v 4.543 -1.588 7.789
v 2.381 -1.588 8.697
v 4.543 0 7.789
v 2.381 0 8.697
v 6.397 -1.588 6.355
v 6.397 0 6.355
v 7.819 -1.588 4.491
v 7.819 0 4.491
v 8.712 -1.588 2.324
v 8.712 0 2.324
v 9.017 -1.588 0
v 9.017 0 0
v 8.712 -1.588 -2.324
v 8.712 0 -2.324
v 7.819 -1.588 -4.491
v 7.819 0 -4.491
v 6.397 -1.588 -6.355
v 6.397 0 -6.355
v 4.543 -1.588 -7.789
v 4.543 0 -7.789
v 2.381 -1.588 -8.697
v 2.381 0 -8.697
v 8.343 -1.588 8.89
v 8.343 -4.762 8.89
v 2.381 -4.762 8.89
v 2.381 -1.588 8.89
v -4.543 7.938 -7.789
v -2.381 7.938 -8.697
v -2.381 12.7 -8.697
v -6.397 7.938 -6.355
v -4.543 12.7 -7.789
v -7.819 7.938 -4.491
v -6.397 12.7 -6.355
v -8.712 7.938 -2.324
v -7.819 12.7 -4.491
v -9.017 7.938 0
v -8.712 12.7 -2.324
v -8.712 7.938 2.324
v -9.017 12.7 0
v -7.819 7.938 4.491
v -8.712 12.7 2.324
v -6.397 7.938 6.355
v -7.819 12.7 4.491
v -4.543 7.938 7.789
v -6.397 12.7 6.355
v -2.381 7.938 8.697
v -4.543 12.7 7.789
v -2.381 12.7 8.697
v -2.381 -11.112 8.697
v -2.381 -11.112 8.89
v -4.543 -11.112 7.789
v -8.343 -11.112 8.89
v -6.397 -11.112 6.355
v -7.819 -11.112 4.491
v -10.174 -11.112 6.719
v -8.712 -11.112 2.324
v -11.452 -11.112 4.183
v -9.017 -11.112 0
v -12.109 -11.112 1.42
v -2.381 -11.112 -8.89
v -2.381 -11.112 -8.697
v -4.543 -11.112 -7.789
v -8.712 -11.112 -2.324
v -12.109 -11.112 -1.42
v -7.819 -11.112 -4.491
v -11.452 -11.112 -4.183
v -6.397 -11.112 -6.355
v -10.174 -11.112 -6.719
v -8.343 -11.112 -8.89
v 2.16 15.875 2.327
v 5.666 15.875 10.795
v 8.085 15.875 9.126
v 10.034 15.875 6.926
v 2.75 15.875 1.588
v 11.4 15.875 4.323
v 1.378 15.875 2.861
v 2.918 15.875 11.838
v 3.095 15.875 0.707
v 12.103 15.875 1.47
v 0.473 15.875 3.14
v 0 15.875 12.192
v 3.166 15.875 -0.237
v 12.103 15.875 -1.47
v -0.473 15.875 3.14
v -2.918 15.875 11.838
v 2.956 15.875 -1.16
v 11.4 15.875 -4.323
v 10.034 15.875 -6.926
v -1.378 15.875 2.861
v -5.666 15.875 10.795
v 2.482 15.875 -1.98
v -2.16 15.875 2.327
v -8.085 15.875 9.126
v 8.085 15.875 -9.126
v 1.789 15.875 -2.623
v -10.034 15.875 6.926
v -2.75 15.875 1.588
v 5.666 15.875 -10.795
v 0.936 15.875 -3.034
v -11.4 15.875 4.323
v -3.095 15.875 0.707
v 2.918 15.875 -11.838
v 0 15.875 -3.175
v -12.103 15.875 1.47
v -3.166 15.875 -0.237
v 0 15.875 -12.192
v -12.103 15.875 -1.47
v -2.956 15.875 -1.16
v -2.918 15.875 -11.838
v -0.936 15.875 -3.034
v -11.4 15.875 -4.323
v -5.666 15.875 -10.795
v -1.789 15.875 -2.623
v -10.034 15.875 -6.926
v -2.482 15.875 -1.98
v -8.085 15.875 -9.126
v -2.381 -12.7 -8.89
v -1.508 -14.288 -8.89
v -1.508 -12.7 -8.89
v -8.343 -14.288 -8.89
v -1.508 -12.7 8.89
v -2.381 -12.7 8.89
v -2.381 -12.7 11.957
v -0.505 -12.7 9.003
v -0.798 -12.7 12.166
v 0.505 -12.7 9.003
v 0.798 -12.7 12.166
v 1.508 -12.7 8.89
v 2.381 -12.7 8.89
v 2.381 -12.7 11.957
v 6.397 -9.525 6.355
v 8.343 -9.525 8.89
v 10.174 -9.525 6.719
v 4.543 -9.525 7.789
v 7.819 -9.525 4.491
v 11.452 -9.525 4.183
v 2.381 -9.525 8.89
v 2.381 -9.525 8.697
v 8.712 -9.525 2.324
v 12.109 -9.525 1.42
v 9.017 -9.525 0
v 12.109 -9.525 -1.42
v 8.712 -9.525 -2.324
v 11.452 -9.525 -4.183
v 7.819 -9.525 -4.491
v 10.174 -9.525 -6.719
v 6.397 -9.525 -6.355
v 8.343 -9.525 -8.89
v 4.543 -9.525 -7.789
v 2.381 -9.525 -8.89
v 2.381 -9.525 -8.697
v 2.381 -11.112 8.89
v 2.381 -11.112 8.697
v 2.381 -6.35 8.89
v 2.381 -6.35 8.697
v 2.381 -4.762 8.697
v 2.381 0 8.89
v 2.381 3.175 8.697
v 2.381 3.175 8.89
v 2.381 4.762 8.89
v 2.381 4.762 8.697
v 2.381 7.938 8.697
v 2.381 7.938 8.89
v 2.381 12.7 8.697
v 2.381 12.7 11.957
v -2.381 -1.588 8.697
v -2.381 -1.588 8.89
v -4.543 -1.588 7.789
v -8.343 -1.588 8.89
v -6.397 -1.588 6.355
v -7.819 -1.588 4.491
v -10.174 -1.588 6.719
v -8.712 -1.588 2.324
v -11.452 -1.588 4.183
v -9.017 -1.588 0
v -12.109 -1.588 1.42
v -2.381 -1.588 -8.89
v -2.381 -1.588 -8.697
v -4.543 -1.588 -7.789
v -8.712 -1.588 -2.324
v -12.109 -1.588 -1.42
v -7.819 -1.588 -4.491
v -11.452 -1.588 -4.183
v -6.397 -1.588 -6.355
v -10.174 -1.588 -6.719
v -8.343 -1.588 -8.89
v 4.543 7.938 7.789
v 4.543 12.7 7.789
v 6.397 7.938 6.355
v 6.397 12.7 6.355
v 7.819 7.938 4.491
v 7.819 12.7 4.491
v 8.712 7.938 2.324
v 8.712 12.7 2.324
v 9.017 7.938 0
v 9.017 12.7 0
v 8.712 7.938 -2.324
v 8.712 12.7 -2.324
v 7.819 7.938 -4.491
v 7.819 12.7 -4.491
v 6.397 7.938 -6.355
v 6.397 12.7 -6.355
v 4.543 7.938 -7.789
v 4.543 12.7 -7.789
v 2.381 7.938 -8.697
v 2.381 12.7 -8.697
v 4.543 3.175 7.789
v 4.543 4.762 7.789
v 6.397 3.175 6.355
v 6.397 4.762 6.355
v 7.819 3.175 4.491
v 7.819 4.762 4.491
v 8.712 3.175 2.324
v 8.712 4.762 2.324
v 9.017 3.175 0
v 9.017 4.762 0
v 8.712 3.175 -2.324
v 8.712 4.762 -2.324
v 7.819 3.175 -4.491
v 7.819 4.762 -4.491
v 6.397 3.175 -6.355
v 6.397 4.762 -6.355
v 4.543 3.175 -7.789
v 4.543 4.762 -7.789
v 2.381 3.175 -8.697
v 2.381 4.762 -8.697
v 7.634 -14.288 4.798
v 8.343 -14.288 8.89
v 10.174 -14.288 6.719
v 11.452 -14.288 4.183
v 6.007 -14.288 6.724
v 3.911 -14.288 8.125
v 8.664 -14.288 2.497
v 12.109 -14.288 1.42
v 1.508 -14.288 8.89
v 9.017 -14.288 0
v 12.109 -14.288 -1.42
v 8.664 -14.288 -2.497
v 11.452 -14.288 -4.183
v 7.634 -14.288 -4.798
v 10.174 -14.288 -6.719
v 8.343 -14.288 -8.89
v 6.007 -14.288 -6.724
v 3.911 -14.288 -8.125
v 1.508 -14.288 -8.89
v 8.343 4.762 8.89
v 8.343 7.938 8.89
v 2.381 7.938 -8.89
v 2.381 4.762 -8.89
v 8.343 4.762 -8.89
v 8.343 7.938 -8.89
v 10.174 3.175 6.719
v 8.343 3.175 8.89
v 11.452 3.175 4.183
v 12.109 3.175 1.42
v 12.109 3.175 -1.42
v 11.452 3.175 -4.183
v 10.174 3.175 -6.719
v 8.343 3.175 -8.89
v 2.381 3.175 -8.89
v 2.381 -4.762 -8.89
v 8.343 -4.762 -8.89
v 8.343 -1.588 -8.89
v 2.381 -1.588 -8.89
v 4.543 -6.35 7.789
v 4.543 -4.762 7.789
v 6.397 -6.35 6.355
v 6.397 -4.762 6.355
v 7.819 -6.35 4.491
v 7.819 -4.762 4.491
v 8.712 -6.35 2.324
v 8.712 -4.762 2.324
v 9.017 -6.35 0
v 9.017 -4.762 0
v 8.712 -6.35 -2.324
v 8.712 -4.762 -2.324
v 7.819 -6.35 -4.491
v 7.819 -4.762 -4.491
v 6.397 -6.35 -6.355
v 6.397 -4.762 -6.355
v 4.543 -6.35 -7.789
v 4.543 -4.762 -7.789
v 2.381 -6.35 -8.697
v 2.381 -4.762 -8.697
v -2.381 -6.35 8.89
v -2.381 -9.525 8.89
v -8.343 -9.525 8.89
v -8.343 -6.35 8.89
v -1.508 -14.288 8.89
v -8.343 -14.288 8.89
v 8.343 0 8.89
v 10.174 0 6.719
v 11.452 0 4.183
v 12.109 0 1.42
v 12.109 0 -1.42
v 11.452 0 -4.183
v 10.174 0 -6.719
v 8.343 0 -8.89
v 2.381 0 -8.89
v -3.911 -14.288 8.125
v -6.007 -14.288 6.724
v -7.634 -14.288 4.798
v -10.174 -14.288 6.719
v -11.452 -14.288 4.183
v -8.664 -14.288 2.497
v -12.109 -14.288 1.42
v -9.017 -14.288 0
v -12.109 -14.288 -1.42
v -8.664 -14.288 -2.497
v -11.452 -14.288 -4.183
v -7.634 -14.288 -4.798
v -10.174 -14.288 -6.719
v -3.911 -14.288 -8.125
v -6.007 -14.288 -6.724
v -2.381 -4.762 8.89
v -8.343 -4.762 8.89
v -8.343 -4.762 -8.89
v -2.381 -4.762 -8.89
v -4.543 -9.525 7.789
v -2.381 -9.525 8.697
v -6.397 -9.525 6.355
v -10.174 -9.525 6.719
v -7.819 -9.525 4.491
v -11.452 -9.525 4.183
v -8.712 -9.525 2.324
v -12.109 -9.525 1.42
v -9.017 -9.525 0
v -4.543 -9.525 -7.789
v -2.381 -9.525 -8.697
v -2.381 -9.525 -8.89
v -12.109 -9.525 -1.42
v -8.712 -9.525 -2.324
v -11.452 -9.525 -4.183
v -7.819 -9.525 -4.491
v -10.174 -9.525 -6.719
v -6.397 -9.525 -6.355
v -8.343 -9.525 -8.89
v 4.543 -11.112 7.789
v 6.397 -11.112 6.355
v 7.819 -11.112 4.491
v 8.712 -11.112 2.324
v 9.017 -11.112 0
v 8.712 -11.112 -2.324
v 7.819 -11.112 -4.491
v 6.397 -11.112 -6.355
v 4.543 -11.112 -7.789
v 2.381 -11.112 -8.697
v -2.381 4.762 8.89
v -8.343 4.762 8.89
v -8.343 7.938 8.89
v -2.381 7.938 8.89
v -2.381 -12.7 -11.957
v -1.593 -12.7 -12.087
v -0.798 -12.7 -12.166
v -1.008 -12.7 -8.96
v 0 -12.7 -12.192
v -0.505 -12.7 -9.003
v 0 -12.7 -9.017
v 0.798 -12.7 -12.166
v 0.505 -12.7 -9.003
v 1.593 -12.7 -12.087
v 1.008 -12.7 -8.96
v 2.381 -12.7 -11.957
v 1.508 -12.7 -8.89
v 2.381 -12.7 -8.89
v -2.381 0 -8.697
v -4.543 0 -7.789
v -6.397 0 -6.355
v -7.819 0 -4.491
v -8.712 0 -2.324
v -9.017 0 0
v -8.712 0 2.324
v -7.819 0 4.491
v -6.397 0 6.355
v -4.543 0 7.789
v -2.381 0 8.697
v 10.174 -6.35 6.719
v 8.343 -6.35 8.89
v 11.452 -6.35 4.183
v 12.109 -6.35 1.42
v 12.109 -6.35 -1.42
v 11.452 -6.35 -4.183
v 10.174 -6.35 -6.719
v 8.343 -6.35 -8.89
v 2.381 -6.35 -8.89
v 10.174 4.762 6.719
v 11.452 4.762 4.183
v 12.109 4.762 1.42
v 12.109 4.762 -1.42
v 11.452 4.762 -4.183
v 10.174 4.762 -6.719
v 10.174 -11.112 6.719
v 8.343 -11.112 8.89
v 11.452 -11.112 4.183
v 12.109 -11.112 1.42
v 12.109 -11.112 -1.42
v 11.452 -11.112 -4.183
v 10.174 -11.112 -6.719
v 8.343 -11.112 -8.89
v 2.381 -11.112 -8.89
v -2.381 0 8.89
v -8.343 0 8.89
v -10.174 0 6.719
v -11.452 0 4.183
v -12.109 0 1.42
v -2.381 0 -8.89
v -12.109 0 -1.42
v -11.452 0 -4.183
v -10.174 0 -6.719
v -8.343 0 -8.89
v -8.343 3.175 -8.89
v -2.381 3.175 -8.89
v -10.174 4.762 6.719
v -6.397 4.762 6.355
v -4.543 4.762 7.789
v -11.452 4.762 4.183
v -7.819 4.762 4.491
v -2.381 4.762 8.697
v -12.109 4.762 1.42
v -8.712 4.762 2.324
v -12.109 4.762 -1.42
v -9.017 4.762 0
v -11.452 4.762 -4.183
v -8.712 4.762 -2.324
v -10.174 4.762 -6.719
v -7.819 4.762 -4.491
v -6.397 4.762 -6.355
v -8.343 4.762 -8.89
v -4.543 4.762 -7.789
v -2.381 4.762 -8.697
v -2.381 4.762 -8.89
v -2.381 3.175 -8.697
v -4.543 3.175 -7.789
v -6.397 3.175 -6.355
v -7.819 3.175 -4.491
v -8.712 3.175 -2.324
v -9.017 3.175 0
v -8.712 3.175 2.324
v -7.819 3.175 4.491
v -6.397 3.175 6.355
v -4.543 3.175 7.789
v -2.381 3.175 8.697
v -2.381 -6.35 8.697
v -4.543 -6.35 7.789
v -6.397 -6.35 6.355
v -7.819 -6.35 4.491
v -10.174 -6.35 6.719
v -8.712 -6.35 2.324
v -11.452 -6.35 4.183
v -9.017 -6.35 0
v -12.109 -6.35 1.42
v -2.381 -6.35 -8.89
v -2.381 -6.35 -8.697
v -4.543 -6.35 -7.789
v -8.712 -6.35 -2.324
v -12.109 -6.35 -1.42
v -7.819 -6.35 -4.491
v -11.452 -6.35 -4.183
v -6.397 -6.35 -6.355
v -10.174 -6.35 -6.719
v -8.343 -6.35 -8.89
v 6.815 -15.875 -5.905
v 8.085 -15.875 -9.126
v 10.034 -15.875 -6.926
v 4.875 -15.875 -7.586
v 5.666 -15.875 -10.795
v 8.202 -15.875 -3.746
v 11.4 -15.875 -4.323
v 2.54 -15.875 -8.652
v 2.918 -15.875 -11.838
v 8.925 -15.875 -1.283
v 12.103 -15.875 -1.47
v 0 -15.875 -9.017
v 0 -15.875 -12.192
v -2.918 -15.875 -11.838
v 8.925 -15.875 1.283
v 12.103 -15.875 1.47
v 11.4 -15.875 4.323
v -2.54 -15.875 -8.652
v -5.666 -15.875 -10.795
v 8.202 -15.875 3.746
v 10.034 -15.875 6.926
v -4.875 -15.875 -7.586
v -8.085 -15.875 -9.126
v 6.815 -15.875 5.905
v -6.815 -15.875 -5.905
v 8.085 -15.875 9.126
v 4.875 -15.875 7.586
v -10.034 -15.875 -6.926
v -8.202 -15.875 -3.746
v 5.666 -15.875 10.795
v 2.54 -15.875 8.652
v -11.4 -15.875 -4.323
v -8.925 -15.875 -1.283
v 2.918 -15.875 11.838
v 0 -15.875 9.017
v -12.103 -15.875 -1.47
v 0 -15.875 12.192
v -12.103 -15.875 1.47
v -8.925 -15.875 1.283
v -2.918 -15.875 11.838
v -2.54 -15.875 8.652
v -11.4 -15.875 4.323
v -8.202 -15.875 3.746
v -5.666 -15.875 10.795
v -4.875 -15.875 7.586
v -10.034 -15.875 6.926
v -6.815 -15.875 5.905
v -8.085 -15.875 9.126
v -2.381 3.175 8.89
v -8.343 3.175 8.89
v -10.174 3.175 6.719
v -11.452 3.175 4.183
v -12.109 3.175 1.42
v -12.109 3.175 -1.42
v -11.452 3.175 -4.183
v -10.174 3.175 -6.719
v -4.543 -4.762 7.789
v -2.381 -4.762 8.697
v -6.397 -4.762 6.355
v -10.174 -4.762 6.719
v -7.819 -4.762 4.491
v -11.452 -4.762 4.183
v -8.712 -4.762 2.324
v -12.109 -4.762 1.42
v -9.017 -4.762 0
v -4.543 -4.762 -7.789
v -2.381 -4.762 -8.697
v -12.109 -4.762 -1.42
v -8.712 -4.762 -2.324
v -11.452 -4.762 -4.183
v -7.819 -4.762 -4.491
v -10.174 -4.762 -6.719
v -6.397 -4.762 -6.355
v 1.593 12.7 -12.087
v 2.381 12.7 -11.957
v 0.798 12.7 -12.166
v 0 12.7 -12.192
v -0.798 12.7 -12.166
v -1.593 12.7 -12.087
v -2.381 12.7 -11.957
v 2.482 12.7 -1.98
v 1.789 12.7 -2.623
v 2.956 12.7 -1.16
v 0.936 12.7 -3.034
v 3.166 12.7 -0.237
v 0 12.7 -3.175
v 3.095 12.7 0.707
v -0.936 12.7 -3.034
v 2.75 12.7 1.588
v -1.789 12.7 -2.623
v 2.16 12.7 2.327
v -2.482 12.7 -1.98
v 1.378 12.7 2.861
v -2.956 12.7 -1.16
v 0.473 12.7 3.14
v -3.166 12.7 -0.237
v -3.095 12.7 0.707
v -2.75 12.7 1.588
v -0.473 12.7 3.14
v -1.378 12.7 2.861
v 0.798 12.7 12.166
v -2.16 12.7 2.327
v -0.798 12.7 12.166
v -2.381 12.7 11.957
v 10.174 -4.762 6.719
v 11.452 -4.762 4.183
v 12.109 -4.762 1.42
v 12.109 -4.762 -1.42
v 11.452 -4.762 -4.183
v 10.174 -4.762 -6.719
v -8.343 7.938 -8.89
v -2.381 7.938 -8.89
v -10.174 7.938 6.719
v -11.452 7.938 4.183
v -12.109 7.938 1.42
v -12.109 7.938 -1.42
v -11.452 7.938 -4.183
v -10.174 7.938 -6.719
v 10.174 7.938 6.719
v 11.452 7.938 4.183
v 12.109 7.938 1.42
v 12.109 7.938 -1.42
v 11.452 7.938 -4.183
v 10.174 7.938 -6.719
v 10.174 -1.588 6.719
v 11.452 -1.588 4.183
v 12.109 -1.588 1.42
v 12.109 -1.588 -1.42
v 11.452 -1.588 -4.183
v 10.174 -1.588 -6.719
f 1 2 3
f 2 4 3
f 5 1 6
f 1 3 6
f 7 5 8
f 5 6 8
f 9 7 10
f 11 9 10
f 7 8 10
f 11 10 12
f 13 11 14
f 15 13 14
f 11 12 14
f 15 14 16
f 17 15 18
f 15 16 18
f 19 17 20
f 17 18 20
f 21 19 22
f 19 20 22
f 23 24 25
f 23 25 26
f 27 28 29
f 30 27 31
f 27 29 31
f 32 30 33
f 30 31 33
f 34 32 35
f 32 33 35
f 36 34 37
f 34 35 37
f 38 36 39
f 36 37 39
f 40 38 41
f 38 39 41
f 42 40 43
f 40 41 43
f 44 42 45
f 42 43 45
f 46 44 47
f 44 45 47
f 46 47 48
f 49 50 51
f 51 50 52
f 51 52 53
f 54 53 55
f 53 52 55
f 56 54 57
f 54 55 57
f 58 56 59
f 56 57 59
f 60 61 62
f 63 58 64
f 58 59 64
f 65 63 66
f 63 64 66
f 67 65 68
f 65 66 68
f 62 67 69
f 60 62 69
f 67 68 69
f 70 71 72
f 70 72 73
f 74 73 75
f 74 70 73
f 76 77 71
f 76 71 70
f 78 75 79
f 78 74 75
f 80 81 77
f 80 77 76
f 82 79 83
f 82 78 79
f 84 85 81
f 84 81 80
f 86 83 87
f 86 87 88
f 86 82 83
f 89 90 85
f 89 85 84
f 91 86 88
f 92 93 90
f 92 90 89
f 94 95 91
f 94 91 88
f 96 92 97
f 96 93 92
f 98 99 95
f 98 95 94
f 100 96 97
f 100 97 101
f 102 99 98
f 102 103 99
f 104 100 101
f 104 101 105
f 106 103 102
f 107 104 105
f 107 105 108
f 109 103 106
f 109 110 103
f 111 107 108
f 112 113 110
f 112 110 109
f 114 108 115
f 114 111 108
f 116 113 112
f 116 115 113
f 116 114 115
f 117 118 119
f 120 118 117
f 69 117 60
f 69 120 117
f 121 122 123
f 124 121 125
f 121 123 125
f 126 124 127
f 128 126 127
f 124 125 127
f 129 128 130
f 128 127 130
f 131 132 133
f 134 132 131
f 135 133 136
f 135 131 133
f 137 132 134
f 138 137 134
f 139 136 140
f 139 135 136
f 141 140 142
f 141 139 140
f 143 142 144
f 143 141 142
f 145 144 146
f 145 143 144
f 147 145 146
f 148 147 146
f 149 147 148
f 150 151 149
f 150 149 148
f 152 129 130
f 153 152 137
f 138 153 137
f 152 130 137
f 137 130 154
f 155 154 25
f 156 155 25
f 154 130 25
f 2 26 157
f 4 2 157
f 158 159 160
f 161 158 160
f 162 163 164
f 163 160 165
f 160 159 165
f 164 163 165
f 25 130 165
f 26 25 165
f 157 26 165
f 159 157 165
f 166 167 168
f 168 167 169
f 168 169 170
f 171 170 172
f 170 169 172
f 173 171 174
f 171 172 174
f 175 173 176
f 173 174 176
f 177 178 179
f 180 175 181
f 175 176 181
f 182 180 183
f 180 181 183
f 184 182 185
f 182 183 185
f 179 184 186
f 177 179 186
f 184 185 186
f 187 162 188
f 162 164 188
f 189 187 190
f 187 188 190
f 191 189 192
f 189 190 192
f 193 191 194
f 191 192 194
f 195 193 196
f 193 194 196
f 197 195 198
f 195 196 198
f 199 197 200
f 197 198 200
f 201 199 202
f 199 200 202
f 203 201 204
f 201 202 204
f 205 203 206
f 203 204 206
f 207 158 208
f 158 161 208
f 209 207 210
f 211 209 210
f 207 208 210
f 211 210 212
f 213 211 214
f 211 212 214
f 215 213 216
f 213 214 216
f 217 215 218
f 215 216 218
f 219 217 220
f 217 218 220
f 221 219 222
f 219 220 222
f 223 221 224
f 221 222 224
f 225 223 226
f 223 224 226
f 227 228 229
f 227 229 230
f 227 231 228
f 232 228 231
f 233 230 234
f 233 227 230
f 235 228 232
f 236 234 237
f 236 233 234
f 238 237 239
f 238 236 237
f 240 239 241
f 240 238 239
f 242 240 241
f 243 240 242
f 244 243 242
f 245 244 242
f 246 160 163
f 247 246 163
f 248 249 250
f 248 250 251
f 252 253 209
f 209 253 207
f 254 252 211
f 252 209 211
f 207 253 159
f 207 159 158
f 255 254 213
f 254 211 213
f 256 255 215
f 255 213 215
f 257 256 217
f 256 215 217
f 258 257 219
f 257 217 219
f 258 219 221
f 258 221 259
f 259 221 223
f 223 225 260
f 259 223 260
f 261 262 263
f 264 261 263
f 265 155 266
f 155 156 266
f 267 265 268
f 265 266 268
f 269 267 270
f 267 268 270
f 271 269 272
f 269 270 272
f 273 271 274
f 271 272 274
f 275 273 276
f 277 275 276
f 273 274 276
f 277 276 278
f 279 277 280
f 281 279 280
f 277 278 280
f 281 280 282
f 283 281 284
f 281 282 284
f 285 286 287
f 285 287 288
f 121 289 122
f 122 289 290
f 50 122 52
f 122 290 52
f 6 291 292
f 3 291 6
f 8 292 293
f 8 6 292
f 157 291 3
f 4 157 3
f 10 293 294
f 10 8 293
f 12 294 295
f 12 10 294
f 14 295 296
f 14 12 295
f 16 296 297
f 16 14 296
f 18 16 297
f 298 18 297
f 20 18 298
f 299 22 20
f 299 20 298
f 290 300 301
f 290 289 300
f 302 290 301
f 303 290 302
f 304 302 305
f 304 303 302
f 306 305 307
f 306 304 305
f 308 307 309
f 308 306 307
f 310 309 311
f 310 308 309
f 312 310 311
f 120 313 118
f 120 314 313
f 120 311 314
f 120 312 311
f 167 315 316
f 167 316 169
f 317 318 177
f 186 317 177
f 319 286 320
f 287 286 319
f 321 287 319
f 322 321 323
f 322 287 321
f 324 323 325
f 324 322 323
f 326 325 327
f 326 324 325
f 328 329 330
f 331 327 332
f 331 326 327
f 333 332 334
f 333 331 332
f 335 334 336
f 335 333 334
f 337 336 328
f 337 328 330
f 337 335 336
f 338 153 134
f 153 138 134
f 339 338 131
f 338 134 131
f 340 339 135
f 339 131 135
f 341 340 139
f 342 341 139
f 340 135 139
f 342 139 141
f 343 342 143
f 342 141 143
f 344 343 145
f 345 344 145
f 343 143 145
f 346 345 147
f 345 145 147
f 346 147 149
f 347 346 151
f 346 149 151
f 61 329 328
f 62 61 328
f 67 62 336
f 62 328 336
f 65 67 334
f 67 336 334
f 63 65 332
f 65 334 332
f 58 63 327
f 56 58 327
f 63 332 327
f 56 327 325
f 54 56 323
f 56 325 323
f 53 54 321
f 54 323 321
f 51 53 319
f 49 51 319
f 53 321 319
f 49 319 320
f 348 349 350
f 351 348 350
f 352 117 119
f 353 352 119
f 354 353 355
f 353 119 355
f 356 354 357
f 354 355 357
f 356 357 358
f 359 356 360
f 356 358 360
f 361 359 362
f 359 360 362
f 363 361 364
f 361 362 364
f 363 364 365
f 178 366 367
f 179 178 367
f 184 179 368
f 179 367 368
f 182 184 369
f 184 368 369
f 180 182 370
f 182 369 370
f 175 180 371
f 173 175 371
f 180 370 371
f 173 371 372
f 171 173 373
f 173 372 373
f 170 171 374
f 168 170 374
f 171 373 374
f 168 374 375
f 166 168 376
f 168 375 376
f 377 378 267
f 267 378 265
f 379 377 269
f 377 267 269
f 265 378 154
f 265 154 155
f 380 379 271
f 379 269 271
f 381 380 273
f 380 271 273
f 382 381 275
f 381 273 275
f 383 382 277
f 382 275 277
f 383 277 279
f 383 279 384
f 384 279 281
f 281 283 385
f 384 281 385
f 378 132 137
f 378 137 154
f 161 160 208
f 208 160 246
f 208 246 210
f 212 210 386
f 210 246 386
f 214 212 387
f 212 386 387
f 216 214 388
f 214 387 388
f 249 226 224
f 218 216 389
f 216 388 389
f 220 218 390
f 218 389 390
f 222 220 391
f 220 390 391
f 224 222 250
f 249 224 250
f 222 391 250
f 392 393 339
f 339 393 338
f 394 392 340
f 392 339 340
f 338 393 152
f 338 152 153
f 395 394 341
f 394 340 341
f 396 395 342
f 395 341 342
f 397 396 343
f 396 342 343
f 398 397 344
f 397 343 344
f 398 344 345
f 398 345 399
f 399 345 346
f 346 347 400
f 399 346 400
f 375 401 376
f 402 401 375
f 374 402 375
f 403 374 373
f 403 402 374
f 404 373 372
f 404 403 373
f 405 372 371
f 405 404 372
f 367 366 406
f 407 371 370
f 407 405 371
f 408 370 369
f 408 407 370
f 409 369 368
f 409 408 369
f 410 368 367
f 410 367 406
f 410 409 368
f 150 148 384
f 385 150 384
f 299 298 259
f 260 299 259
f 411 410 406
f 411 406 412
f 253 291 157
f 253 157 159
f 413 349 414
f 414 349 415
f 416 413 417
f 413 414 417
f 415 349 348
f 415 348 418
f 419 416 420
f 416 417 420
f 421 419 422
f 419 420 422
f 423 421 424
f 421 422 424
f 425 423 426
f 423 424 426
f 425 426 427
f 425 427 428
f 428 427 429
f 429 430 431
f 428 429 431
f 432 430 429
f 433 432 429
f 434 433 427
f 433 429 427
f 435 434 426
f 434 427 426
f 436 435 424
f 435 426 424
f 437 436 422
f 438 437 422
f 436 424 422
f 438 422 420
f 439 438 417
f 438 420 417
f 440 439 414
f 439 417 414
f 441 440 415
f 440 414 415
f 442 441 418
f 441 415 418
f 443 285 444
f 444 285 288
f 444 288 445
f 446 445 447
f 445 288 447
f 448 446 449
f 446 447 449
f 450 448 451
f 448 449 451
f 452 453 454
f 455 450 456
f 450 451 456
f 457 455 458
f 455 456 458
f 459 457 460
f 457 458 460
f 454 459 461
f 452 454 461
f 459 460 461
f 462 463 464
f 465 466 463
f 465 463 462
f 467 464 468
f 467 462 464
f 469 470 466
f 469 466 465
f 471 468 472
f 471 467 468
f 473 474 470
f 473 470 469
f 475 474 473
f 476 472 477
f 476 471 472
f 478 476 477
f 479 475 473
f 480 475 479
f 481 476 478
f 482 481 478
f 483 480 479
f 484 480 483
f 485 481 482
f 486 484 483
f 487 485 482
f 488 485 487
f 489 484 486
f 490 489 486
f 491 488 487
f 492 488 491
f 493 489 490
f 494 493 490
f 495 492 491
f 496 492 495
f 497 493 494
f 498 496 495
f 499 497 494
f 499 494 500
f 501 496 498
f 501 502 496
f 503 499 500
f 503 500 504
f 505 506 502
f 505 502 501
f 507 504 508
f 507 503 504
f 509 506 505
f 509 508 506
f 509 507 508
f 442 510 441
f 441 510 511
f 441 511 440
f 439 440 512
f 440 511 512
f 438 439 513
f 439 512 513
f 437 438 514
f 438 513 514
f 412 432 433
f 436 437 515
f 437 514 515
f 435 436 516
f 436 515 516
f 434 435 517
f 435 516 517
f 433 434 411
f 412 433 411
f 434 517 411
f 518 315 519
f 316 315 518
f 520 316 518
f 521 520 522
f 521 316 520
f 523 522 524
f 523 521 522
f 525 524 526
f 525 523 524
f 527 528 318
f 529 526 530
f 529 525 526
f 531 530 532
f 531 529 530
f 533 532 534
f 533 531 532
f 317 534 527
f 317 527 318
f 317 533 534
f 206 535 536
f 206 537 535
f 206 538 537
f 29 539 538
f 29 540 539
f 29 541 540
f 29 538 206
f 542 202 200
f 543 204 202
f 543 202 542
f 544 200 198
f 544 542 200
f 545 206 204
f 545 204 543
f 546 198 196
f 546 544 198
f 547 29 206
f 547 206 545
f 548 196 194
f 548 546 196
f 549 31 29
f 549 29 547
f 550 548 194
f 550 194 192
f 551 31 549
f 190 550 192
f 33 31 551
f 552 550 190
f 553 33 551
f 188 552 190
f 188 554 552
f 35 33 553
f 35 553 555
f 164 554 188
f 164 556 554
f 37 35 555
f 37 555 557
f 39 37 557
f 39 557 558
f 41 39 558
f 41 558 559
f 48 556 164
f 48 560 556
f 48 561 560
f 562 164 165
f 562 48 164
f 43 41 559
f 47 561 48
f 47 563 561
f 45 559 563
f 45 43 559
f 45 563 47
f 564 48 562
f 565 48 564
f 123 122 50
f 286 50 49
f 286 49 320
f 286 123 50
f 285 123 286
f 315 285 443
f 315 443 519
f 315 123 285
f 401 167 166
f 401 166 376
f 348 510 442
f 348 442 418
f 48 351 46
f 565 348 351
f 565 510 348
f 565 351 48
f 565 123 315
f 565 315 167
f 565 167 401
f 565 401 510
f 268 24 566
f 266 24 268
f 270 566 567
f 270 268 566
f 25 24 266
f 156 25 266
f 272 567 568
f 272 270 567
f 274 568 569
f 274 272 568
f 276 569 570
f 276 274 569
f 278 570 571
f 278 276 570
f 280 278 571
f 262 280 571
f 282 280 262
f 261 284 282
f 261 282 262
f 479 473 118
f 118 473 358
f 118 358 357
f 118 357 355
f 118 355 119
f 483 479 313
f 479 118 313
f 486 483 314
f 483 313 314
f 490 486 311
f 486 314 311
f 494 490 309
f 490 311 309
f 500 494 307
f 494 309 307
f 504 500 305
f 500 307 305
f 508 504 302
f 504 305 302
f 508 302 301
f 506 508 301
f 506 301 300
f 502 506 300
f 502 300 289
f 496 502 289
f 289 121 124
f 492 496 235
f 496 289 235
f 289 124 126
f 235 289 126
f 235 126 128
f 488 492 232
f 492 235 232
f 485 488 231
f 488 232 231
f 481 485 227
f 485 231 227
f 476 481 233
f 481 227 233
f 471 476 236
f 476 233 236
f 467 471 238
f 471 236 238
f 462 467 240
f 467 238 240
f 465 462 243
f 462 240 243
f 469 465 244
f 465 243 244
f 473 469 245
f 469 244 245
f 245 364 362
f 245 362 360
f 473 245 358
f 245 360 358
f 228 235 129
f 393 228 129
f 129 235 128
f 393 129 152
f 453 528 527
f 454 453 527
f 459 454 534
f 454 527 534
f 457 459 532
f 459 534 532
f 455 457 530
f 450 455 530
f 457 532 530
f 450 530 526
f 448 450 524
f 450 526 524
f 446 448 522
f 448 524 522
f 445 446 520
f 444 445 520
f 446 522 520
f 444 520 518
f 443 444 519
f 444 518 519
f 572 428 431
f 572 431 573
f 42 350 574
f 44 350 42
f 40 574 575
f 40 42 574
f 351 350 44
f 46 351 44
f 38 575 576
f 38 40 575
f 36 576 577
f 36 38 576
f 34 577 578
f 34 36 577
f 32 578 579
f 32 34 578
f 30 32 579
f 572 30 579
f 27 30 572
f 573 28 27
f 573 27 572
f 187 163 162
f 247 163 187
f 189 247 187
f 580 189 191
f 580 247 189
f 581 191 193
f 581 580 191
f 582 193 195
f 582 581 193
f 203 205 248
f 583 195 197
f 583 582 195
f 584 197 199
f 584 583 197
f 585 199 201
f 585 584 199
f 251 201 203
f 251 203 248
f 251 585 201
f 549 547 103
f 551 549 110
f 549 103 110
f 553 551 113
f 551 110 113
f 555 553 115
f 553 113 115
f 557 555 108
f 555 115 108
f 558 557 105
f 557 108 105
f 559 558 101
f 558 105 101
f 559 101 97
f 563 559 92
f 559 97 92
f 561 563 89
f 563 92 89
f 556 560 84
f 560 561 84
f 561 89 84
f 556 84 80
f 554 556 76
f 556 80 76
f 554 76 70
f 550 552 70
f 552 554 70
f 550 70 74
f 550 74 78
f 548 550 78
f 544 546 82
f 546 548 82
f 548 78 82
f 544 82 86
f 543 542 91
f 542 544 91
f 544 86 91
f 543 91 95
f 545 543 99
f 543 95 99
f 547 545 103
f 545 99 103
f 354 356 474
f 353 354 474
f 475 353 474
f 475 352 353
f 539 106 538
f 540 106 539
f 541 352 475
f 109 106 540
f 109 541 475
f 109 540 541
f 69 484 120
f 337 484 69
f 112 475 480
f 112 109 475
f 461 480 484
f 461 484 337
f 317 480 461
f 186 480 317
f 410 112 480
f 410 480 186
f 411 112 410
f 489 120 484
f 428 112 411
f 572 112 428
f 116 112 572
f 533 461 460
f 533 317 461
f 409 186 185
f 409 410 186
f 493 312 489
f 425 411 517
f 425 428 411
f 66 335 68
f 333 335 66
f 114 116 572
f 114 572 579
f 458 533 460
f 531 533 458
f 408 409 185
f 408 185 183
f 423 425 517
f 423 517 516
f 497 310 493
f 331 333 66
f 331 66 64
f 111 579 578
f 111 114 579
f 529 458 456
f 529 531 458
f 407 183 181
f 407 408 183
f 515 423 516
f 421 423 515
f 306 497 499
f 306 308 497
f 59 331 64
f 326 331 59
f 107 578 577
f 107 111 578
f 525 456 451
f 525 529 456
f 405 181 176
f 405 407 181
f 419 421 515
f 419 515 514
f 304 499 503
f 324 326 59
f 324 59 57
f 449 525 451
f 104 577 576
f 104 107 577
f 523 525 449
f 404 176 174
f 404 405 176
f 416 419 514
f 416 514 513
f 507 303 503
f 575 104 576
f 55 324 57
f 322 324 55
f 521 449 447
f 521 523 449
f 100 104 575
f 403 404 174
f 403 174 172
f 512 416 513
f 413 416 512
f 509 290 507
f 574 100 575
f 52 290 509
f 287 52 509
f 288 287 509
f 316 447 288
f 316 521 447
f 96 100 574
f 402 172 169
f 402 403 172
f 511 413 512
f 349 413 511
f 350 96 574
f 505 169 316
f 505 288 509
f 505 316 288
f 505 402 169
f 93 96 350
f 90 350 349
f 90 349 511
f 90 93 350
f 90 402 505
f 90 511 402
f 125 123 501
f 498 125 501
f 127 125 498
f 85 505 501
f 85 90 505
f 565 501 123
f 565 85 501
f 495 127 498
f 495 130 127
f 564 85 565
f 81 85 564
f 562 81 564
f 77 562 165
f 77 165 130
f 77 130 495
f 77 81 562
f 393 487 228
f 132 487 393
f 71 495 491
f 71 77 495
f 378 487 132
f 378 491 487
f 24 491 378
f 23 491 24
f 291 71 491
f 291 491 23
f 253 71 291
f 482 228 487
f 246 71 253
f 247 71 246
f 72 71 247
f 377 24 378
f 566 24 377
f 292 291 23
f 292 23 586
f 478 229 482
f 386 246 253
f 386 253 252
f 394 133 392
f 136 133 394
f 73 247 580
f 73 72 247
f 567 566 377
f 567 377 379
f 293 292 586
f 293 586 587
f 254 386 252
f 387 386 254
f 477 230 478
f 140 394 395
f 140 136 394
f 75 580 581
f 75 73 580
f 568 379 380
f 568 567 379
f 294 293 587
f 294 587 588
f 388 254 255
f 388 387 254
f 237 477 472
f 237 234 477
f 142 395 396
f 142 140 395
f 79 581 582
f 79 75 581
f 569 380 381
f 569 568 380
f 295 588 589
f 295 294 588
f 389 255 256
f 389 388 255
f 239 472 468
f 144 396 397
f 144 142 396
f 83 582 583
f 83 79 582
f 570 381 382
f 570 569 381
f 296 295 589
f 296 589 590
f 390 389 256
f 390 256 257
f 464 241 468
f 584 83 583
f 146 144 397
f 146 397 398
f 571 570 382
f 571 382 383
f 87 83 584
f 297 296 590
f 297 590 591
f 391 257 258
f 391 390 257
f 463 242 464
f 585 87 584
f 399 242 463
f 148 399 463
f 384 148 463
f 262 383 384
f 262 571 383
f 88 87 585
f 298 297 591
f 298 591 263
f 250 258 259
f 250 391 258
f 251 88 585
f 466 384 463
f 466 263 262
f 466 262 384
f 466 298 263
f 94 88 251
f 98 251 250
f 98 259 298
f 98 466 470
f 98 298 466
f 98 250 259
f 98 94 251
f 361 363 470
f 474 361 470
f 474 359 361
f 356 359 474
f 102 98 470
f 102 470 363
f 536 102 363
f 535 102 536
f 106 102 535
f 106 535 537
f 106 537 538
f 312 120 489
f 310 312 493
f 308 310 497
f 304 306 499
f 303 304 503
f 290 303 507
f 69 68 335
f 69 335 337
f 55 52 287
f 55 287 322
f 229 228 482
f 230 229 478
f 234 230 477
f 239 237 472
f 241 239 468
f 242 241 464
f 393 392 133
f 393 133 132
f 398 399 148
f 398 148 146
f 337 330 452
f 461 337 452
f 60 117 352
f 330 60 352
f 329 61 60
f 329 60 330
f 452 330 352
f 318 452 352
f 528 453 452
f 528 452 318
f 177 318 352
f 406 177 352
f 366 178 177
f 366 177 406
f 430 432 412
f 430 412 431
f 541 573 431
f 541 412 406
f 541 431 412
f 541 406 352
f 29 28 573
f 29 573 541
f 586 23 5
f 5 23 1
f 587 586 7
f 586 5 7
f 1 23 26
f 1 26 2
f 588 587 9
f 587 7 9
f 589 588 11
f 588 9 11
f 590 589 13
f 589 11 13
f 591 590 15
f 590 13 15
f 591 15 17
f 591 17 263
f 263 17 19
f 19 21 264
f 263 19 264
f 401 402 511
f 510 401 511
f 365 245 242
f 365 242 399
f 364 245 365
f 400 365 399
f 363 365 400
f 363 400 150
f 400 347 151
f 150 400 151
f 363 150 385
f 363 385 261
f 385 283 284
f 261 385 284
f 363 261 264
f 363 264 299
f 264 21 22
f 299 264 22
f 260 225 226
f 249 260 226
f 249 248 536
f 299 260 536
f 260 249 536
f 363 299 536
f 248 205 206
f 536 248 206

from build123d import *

# Parameters (mm, degrees)
SKETCH1_W          = 5.842
SKETCH1_H          = 3.175
SKETCH1_W_2        = 3.175
SKETCH1_H_2        = 31.75
SKETCH2_W          = 4.7625
SKETCH2_H          = 25.4
CUT_EXTRUDE1_DEPTH = 25.4
SKETCH3_W          = 17.78
SKETCH3_H          = 3.175
CUT_EXTRUDE2_DEPTH = 25.4


with BuildPart() as part:
    # Sketch1 → Revolve1 (revolve)
    with BuildSketch(Plane.XY, mode=Mode.PRIVATE) as revolve1_sk:
        with Locations((6.096, 14.2875)):
            Rectangle(SKETCH1_W, SKETCH1_H)
        with Locations((10.6045, 0)):
            Rectangle(SKETCH1_W_2, SKETCH1_H_2)
    revolve(revolve1_sk.sketch.rotate(Axis((0, 0, 0), (0, 1, 0)), 90), axis=Axis((0, 0, 0), (0, 1, 0)))

    # Sketch2 → Cut-Extrude1 (cut, symmetric)
    with BuildSketch(Plane.XY):
        Rectangle(SKETCH2_W, SKETCH2_H)
    extrude(amount=CUT_EXTRUDE1_DEPTH, both=True, mode=Mode.SUBTRACT)

    # Sketch3 → Cut-Extrude2 (cut, symmetric)
    with BuildSketch(Plane(origin=(0, 0, 0), x_dir=(0, 0, -1), z_dir=(1, 0, 0))):
        with Locations((0, -12.7)):
            Rectangle(SKETCH3_W, SKETCH3_H)
        with Locations((0, -7.9375)):
            Rectangle(SKETCH3_W, SKETCH3_H)
        with Locations((0, -3.175)):
            Rectangle(SKETCH3_W, SKETCH3_H)
        with Locations((0, 1.5875)):
            Rectangle(SKETCH3_W, SKETCH3_H)
        with Locations((0, 6.35)):
            Rectangle(SKETCH3_W, SKETCH3_H)
    extrude(amount=CUT_EXTRUDE2_DEPTH, both=True, mode=Mode.SUBTRACT)


solid = part.part
